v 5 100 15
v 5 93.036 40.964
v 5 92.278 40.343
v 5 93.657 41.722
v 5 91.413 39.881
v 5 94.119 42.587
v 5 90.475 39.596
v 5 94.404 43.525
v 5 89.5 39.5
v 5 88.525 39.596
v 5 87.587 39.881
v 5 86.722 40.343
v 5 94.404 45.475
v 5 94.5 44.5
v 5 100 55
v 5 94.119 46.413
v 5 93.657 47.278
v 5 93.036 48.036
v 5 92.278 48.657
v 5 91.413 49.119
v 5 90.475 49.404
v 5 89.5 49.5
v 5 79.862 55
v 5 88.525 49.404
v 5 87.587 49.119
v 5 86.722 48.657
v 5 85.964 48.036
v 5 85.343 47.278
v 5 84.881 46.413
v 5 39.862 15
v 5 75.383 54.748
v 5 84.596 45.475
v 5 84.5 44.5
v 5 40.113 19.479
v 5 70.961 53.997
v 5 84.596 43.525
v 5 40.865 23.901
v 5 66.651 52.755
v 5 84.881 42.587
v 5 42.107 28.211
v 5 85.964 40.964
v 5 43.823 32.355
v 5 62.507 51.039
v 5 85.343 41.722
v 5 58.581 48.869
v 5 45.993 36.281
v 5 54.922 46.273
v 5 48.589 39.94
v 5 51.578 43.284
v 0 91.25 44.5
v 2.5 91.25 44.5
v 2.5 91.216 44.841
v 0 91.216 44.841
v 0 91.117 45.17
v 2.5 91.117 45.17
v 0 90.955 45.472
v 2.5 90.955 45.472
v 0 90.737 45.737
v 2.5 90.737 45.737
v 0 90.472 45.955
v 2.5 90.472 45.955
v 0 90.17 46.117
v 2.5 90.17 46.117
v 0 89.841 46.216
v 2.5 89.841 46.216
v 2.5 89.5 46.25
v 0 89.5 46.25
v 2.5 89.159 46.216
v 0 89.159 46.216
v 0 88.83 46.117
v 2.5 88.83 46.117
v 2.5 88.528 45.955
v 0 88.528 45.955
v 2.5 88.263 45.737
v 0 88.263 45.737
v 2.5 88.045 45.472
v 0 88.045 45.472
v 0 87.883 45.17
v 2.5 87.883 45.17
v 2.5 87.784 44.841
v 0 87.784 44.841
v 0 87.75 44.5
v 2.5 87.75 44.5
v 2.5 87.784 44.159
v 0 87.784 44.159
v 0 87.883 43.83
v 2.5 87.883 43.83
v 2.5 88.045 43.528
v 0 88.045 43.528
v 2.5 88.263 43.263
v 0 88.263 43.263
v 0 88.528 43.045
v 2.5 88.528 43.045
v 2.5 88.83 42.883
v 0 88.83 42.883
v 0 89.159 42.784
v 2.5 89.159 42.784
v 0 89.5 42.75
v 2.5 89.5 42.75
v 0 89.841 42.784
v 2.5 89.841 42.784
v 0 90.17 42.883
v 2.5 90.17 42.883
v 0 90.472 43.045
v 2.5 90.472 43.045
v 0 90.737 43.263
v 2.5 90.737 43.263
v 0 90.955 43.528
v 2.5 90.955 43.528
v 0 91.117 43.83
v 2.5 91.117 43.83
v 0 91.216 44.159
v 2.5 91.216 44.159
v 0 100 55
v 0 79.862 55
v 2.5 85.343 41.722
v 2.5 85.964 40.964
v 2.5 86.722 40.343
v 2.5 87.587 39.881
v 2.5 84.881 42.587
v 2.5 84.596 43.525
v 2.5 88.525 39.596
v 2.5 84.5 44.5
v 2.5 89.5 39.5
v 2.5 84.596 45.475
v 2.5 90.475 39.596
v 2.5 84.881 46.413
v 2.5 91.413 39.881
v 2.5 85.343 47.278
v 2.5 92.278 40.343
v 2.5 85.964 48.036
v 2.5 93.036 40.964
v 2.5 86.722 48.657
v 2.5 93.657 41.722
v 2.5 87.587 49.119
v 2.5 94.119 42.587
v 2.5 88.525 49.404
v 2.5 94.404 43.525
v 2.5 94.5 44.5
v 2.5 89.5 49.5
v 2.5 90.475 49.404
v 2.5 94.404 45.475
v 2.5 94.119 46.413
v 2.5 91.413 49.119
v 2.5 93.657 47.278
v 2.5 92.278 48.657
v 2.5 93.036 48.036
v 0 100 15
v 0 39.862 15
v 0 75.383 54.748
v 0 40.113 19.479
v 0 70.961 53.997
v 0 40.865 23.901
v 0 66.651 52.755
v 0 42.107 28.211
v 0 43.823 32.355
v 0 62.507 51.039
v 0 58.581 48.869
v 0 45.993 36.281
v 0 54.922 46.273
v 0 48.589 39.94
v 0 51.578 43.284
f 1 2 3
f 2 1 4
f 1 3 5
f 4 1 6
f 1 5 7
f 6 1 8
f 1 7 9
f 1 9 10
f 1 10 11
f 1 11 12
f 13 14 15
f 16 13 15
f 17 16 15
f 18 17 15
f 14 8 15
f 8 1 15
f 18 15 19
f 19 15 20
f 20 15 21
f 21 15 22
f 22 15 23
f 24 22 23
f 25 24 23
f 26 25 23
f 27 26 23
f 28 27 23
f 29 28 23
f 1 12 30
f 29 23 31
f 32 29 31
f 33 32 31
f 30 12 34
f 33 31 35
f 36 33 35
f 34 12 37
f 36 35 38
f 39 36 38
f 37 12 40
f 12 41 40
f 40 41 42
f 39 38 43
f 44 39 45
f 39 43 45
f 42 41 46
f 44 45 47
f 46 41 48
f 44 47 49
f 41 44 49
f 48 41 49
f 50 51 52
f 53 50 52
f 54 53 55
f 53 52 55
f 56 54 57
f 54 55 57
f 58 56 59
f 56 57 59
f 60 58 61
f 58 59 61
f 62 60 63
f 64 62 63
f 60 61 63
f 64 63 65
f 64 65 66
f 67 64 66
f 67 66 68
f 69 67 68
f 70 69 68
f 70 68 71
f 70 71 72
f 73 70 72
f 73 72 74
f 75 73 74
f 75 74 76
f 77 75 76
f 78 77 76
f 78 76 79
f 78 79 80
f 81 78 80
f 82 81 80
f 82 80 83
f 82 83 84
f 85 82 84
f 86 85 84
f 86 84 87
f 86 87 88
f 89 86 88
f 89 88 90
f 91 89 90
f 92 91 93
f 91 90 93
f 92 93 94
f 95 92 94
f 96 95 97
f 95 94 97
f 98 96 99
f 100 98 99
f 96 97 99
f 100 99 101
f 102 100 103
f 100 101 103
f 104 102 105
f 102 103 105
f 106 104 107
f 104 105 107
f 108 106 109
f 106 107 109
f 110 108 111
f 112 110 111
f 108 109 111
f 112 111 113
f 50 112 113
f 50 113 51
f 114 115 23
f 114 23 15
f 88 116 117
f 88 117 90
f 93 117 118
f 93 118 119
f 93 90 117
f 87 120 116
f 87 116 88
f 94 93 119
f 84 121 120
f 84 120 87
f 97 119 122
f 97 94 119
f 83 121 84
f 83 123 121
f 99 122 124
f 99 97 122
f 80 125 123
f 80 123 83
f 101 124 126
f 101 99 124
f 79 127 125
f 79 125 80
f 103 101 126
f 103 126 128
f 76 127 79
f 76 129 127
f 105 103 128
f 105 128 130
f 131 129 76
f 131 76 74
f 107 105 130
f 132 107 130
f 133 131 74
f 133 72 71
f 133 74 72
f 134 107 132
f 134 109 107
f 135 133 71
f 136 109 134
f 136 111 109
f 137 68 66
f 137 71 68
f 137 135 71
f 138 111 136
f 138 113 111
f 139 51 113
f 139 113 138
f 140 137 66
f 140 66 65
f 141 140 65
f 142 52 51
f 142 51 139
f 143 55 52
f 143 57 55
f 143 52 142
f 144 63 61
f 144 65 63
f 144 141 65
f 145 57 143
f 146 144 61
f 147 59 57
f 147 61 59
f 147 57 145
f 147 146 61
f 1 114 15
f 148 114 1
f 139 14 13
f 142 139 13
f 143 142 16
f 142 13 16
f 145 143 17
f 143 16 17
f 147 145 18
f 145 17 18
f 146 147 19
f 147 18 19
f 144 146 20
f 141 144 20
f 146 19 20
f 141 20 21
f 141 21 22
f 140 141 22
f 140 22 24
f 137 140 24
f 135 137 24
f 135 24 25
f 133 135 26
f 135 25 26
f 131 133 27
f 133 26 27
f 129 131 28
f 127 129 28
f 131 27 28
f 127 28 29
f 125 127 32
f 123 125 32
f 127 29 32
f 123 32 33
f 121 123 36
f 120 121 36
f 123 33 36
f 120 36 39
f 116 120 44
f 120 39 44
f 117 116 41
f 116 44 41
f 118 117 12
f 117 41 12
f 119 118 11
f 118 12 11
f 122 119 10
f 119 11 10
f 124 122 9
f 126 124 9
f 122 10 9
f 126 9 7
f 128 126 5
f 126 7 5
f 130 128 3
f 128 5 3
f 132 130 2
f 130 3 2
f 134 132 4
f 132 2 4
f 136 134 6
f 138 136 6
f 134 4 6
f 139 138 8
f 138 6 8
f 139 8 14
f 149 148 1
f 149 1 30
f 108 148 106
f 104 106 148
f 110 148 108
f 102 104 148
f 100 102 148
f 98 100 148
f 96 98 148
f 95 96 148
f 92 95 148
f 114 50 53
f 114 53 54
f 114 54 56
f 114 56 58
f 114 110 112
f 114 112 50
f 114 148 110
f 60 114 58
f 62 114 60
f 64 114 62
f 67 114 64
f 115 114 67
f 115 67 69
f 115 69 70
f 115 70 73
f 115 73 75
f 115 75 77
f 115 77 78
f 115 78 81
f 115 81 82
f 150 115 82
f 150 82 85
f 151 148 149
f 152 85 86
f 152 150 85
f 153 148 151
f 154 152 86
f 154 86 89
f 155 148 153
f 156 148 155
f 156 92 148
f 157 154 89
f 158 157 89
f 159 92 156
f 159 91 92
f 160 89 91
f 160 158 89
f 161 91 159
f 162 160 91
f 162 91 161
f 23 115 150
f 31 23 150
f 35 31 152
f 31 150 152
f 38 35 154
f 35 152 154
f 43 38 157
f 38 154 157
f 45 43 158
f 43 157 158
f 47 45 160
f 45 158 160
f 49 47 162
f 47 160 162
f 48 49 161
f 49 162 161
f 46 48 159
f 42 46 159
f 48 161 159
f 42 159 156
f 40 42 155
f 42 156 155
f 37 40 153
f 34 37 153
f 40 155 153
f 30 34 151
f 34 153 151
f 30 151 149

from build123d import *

# Parameters (mm, degrees)
PAD_DEPTH       = 5
SKETCH001_R     = 5
POCKET_DEPTH    = 2.5
SKETCH002_R     = 1.75
POCKET001_DEPTH = 5


with BuildPart() as part:
    # Sketch (on YZ_Plane of Origin) → Pad (new body)
    with BuildSketch(Plane.YZ):
        with BuildLine():
            Line((100, 15), (39.86189, 15))
            ThreePointArc((79.86189, 55), (51.577619, 43.284271), (39.86189, 15))
            Line((79.86189, 55), (100, 55))
            Line((100, 55), (100, 15))
        make_face()
    extrude(amount=PAD_DEPTH)

    # Sketch001 (on Face6 of Pad) → Pocket (cut)
    with BuildSketch(Plane.YZ.offset(5)):
        with Locations((89.5, 44.5)):
            Circle(SKETCH001_R)
    extrude(amount=-POCKET_DEPTH, mode=Mode.SUBTRACT)

    # Sketch002 (on Face8 of Pocket) → Pocket001 (cut)
    with BuildSketch(Plane.YZ.offset(2.5)):
        with Locations((89.5, 44.5)):
            Circle(SKETCH002_R)
    extrude(amount=-POCKET001_DEPTH, mode=Mode.SUBTRACT)


solid = part.part
